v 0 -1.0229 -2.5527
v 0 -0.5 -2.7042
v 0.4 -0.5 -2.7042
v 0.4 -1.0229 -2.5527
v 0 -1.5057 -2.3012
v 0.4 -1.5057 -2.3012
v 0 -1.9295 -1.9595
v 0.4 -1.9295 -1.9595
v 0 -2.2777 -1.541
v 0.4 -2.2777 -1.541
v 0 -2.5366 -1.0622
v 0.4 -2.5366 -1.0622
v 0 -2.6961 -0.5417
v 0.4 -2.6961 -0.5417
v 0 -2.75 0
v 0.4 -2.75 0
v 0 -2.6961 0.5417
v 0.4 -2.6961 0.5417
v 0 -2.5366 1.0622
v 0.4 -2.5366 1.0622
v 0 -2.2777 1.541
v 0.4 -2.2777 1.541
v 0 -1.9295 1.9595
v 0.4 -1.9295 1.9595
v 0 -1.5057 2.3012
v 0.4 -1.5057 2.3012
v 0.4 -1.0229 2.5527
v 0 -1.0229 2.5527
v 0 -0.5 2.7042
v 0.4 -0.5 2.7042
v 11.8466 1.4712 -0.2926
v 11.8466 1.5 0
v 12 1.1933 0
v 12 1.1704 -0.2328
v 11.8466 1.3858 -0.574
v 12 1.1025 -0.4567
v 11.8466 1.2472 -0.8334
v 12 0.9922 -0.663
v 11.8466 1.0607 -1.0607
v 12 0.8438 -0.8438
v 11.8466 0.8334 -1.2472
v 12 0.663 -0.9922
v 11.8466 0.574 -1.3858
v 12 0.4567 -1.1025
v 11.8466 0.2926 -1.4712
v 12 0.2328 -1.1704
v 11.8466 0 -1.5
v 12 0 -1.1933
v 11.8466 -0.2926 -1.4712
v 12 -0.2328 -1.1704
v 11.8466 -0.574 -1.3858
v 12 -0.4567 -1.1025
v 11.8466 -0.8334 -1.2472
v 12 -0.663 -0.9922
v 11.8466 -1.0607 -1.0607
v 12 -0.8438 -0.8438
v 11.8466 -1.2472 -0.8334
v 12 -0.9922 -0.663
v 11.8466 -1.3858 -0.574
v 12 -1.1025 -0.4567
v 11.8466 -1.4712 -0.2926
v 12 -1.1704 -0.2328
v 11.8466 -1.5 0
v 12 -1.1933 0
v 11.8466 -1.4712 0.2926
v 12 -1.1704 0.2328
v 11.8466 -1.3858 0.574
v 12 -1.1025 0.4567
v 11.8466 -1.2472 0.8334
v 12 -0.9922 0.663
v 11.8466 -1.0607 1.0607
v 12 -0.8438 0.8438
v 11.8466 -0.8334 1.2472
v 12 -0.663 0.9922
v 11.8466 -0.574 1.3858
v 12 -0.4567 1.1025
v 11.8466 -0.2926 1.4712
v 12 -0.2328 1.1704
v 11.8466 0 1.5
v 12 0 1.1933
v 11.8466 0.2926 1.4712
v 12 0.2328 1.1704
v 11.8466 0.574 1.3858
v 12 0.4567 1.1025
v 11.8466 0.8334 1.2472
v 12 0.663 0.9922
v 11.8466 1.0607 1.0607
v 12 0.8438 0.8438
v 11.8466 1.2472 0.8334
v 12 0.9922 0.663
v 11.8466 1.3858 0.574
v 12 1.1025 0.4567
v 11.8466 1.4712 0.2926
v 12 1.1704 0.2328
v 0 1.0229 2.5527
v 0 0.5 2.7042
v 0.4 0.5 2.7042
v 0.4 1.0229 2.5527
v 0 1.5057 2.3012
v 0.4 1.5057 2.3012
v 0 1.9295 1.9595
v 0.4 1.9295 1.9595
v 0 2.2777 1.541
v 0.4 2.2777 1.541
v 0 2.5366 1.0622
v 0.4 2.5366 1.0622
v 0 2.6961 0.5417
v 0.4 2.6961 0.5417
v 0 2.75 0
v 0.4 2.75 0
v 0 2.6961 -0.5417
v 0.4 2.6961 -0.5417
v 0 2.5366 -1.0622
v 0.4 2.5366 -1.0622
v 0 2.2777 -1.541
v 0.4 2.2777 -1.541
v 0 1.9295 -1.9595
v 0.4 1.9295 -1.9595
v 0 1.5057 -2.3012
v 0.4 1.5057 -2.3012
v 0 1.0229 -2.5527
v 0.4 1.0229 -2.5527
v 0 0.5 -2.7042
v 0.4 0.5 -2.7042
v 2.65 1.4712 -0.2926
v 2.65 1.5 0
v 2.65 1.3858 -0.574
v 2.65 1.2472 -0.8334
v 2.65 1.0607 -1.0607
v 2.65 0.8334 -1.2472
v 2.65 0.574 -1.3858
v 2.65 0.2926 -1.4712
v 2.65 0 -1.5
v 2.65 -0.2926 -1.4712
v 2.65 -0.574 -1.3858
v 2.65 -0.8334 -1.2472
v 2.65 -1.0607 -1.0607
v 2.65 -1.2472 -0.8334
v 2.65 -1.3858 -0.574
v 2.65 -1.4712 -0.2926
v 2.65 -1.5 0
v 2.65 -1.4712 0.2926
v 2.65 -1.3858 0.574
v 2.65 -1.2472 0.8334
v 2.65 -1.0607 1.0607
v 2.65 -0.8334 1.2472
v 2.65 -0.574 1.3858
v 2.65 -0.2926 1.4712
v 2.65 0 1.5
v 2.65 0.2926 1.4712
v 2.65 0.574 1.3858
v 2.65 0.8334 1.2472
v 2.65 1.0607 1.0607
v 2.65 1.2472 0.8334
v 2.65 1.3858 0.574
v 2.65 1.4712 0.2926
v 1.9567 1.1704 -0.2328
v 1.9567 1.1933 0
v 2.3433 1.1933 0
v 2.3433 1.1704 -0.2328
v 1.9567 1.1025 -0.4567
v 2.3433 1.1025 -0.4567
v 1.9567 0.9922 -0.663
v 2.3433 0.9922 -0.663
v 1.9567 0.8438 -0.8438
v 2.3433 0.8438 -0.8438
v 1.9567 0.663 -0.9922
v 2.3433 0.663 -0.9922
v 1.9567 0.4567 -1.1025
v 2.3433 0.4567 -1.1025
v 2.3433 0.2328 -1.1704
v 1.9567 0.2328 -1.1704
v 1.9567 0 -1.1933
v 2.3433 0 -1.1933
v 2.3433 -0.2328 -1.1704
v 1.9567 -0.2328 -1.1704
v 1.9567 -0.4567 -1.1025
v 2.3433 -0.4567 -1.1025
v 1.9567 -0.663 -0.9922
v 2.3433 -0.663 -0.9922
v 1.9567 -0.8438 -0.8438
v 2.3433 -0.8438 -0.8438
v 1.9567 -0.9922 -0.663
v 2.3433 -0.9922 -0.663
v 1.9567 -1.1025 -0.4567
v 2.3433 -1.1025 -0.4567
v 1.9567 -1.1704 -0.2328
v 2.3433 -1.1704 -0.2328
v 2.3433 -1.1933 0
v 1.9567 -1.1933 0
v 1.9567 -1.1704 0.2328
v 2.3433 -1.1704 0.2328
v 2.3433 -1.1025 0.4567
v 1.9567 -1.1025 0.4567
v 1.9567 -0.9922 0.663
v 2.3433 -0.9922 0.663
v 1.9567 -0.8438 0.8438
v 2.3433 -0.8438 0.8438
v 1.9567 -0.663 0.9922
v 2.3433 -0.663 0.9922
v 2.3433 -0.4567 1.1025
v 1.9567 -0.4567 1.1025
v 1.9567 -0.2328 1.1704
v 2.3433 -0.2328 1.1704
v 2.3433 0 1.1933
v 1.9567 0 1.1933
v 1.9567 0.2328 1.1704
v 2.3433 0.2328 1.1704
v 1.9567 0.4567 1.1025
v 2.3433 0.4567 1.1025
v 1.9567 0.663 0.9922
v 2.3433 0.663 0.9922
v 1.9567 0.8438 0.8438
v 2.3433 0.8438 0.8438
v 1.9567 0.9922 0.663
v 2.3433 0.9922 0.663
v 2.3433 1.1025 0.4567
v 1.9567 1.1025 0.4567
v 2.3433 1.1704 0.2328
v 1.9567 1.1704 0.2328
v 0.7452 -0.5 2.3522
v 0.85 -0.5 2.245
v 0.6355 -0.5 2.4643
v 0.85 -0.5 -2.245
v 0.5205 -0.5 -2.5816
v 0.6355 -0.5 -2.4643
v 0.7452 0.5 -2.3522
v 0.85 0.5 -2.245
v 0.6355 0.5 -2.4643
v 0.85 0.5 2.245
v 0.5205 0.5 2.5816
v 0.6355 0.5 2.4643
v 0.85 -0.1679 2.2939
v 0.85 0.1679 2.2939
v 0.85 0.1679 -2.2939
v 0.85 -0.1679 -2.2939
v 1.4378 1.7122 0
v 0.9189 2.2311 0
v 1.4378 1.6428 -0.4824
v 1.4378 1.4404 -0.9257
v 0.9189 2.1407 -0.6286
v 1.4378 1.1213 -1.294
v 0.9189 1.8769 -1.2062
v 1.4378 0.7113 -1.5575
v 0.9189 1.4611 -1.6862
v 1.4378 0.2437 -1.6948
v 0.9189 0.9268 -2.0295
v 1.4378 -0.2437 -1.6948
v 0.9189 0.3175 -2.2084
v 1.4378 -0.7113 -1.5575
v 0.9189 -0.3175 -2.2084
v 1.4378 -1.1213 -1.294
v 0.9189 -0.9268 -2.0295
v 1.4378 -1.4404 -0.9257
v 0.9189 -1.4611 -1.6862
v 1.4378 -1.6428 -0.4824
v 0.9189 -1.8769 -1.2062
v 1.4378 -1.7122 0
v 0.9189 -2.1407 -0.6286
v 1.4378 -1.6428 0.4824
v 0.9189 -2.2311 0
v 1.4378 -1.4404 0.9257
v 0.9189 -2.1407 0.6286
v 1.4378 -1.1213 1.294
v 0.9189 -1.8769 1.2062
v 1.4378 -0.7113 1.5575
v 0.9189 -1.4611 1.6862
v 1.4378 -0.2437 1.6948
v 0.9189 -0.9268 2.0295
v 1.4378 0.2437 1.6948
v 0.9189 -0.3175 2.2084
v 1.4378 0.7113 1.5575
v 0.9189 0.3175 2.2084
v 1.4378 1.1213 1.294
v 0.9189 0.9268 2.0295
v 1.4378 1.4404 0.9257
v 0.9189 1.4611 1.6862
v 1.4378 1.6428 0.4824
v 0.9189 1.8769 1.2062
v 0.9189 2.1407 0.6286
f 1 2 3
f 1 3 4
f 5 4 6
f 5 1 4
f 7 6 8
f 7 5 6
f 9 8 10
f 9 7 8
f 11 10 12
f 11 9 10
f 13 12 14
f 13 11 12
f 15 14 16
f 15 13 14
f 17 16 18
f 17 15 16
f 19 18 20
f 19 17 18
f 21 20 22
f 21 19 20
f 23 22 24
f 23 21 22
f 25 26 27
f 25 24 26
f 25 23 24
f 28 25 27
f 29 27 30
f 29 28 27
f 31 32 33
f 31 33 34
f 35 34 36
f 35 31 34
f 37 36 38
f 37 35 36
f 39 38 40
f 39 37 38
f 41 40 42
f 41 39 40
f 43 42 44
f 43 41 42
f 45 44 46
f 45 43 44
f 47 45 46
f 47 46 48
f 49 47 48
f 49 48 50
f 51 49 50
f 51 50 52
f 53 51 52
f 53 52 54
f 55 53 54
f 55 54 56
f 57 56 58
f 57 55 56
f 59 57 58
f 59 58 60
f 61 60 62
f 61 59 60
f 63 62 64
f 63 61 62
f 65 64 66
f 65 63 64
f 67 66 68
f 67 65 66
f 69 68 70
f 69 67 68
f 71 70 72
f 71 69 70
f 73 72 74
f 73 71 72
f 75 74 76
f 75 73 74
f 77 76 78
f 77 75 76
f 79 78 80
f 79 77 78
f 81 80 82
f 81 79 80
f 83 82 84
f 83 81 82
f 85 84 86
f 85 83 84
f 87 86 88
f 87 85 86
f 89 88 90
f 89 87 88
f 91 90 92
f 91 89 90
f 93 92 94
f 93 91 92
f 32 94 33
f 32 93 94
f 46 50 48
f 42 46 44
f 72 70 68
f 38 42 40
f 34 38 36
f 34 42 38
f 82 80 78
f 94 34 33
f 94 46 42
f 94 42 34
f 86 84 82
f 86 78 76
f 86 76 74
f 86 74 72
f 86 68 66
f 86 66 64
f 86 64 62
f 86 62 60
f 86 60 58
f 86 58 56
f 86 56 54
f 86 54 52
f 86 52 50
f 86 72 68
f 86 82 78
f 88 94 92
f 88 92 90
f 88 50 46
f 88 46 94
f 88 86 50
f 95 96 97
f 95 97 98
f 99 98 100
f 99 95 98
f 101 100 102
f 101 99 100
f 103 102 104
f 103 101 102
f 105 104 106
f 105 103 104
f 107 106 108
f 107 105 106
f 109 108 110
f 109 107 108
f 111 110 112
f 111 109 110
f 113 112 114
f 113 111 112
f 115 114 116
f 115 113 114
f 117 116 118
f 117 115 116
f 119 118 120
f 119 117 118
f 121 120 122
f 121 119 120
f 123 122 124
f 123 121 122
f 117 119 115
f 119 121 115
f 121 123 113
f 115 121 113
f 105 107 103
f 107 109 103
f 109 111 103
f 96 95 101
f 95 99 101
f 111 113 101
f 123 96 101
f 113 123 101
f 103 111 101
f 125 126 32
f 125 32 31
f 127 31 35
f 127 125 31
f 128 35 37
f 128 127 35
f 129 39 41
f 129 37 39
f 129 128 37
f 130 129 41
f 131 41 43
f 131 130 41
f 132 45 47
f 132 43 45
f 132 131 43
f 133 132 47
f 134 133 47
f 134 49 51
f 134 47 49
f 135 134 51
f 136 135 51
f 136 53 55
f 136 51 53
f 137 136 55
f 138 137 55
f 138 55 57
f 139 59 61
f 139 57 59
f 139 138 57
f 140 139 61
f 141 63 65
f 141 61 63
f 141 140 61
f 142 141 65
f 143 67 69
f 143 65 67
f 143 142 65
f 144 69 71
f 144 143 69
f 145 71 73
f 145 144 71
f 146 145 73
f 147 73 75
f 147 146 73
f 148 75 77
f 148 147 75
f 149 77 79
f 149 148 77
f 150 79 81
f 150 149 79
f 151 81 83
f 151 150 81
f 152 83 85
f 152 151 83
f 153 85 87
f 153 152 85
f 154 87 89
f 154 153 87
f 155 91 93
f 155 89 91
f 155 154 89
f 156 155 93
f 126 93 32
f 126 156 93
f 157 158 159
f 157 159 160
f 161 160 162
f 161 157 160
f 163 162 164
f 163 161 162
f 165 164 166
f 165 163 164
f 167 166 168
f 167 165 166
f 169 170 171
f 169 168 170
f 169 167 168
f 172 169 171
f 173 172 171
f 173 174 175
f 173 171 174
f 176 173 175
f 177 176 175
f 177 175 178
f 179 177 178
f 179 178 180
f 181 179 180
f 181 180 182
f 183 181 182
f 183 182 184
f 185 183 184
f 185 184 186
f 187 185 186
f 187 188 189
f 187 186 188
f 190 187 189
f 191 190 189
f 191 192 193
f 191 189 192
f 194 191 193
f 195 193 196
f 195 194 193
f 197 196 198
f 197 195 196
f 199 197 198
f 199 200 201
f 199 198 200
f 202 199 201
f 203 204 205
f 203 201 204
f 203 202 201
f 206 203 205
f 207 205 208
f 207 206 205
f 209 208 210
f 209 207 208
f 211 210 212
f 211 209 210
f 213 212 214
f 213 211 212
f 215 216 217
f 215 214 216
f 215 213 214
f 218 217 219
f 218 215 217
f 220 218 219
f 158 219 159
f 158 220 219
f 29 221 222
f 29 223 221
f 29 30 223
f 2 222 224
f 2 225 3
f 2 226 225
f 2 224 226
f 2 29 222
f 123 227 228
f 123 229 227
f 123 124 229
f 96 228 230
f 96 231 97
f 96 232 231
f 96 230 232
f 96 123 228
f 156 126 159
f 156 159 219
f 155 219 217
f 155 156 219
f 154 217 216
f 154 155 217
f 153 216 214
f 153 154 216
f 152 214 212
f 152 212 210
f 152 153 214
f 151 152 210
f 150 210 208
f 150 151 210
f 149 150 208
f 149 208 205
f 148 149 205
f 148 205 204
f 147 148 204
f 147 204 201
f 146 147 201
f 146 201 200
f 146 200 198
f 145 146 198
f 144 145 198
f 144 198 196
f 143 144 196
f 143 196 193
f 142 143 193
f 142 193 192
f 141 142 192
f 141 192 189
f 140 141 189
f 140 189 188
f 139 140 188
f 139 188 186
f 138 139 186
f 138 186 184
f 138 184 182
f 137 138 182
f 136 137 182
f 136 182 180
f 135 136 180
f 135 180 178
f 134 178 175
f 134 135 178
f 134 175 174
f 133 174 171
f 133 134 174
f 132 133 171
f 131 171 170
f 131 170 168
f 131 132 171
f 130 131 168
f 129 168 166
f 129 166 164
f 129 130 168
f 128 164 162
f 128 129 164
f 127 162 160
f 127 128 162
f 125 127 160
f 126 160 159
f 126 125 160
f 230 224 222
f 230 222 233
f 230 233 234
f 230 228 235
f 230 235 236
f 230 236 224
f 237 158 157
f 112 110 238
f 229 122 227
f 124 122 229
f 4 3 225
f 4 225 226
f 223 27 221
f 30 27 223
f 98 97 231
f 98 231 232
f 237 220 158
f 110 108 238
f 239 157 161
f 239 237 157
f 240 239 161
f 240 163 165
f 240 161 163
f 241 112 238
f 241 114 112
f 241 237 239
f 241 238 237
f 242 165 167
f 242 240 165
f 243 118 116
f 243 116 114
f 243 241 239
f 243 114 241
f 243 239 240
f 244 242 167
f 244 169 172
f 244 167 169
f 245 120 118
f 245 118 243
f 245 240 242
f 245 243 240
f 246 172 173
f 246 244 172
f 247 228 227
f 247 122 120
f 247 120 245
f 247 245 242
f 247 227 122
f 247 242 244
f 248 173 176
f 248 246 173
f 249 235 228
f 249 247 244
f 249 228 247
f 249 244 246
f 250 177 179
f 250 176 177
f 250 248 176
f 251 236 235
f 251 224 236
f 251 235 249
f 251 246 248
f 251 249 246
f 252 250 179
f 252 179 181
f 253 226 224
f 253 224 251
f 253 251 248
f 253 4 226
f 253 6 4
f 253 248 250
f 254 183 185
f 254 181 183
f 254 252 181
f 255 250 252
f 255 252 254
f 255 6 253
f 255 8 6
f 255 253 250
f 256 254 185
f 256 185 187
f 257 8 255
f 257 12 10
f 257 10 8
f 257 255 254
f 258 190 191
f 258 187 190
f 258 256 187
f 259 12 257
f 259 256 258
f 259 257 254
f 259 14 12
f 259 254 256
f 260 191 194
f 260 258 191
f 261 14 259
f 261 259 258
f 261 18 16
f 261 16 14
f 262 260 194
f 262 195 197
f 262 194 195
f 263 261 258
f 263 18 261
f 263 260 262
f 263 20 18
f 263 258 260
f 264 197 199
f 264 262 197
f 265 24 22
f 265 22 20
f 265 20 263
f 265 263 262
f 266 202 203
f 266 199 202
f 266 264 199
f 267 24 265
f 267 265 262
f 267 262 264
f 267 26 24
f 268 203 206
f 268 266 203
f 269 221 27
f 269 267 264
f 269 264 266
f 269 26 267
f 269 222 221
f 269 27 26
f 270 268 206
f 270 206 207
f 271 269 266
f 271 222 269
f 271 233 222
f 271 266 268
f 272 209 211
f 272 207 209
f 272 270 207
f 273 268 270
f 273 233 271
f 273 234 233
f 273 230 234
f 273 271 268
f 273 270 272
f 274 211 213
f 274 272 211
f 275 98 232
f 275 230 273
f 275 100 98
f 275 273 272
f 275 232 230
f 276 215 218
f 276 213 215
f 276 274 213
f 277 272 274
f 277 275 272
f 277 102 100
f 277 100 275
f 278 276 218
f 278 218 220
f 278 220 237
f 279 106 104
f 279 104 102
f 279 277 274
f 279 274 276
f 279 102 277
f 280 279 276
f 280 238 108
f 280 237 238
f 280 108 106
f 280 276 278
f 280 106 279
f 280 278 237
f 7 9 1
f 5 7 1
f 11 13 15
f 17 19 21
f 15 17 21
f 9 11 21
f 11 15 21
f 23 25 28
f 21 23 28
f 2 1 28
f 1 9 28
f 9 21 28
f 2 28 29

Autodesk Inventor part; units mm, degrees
ref_plane "YZ Plane" through (0, 0, 0) normal (1, 0, 0) x (0, 1, 0)
ref_plane "XZ Plane" through (0, 0, 0) normal (0, 1, 0) x (-1, 0, 0)
sketch "Sketch1" plane through (0, 0, 0) normal (0, 0, 1) x (1, 0, 0)
  line L0 (0, 0) -> (12, 0)
  line L1 (12, 0) -> (12, 1.5)
  line L2 (12, 1.5) -> (2.65, 1.5)
  line L3 (2.65, 1.5) -> (2.3433, 1.1933)
  line L4 (2.3433, 1.1933) -> (1.9567, 1.1933)
  line L5 (1.9567, 1.1933) -> (0.4, 2.75)
  line L6 (0.4, 2.75) -> (0, 2.75)
  line L7 (0, 2.75) -> (0, 0)
  line L8 (2.65, 1.5) -> (1.65, 1.5) construction
  line L9 (-2.4, 0) -> (14.4, 0) projected
  line L10 (0, 3.3) -> (0, -0.55) projected
  dimension "d0" = 12
  dimension "d1" = 45
  dimension "d2" = 0.3067
  dimension "d3" = 9.35
  dimension "d4" = 1.65
  dimension "d5" = 2.3866
  dimension "d6" = 3
  dimension "d7" = 5.5
revolve "Body" add sketch "Sketch1" angle 360 about axis through (0, 0, 0) along (1, 0, 0)
sketch "Sketch2" plane through (0, 0, 0) normal (-1, 0, 0) x (0, 0, 1)
  line L0 (2.75, -0.5) -> (-2.75, -0.5)
  line L1 (-2.75, -0.5) -> (-2.75, 0.5)
  line L2 (-2.75, 0.5) -> (2.75, 0.5)
  line L3 (2.75, 0.5) -> (2.75, -0.5)
  line L4 (0, 0.5) -> (0, -0.5) construction
  line L5 (-2.75, 0) -> (2.75, 0) construction
  line L6 (0, 2.75) -> (0, 0) projected
  dimension "d15" = 1
  dimension "d16" = 5.5
extrude "Slot" cut sketch "Sketch2" against normal blind 0.85
thread "Thread" size "M3x0.5" class "6g" standard "ISO Metric profile" length 9.35
chamfer "Chamfer1" distance 0.3067 distance2 0.1534 1 edges at (12, -1.5, 0) measured on face at (12, 0.1505, 0.4164)
ref_plane "Work Plane1" through (33.575, 0, 0) normal (0, 0, -1) x (1, 0, 0)
equation "\"d0\" = NLG"
equation "\"d1\" = 0.5 * SEWI"
equation "\"d2\" = GAL"
equation "\"d3\" = GEL"
equation "\"d4\" = KOH"
equation "\"d5\" = BDM"
equation "\"d6\" = GD"
equation "\"d7\" = KOD"
equation "\"d15\" = SBR"
equation "\"d16\" = KOD"
equation "\"d8\" = STI"
equation "\"d10\" = GEL"
equation "\"d12\" = -0.5 * SPD + 0.5 * GD"
equation "\"d13\" = 0.5 * GAL"
equation "\"NLG\" = 12"
equation "\"GAL\" = 0.61345 * PTC"
equation "\"GEL\" = 9.35"
equation "\"KOH\" = 1.65"
equation "\"KOD\" = 5.5"
equation "\"SEWI\" = 90deg"
equation "\"BDM\" = NND - 1.2269 * PTC"
equation "\"GD\" = NND"
equation "\"SBR\" = 1"
equation "\"STI\" = 0.85"
equation "\"SPD\" = NND - 1.2269 * PTC"
equation "\"GUL\" = 0.61345 * PTC"
equation "\"PTC\" = 0.5"
equation "\"EPV\" = 3.15"
equation "\"THREADDIA\" = 3"
equation "\"TOA\" = 30deg"
equation "\"NND\" = 3"
equation "\"GD1\" = THREADDIA - 1.2269 * PTC"
properties part number "ISO 2009 - M3 x 12" material "Stainless Steel, 440C"
